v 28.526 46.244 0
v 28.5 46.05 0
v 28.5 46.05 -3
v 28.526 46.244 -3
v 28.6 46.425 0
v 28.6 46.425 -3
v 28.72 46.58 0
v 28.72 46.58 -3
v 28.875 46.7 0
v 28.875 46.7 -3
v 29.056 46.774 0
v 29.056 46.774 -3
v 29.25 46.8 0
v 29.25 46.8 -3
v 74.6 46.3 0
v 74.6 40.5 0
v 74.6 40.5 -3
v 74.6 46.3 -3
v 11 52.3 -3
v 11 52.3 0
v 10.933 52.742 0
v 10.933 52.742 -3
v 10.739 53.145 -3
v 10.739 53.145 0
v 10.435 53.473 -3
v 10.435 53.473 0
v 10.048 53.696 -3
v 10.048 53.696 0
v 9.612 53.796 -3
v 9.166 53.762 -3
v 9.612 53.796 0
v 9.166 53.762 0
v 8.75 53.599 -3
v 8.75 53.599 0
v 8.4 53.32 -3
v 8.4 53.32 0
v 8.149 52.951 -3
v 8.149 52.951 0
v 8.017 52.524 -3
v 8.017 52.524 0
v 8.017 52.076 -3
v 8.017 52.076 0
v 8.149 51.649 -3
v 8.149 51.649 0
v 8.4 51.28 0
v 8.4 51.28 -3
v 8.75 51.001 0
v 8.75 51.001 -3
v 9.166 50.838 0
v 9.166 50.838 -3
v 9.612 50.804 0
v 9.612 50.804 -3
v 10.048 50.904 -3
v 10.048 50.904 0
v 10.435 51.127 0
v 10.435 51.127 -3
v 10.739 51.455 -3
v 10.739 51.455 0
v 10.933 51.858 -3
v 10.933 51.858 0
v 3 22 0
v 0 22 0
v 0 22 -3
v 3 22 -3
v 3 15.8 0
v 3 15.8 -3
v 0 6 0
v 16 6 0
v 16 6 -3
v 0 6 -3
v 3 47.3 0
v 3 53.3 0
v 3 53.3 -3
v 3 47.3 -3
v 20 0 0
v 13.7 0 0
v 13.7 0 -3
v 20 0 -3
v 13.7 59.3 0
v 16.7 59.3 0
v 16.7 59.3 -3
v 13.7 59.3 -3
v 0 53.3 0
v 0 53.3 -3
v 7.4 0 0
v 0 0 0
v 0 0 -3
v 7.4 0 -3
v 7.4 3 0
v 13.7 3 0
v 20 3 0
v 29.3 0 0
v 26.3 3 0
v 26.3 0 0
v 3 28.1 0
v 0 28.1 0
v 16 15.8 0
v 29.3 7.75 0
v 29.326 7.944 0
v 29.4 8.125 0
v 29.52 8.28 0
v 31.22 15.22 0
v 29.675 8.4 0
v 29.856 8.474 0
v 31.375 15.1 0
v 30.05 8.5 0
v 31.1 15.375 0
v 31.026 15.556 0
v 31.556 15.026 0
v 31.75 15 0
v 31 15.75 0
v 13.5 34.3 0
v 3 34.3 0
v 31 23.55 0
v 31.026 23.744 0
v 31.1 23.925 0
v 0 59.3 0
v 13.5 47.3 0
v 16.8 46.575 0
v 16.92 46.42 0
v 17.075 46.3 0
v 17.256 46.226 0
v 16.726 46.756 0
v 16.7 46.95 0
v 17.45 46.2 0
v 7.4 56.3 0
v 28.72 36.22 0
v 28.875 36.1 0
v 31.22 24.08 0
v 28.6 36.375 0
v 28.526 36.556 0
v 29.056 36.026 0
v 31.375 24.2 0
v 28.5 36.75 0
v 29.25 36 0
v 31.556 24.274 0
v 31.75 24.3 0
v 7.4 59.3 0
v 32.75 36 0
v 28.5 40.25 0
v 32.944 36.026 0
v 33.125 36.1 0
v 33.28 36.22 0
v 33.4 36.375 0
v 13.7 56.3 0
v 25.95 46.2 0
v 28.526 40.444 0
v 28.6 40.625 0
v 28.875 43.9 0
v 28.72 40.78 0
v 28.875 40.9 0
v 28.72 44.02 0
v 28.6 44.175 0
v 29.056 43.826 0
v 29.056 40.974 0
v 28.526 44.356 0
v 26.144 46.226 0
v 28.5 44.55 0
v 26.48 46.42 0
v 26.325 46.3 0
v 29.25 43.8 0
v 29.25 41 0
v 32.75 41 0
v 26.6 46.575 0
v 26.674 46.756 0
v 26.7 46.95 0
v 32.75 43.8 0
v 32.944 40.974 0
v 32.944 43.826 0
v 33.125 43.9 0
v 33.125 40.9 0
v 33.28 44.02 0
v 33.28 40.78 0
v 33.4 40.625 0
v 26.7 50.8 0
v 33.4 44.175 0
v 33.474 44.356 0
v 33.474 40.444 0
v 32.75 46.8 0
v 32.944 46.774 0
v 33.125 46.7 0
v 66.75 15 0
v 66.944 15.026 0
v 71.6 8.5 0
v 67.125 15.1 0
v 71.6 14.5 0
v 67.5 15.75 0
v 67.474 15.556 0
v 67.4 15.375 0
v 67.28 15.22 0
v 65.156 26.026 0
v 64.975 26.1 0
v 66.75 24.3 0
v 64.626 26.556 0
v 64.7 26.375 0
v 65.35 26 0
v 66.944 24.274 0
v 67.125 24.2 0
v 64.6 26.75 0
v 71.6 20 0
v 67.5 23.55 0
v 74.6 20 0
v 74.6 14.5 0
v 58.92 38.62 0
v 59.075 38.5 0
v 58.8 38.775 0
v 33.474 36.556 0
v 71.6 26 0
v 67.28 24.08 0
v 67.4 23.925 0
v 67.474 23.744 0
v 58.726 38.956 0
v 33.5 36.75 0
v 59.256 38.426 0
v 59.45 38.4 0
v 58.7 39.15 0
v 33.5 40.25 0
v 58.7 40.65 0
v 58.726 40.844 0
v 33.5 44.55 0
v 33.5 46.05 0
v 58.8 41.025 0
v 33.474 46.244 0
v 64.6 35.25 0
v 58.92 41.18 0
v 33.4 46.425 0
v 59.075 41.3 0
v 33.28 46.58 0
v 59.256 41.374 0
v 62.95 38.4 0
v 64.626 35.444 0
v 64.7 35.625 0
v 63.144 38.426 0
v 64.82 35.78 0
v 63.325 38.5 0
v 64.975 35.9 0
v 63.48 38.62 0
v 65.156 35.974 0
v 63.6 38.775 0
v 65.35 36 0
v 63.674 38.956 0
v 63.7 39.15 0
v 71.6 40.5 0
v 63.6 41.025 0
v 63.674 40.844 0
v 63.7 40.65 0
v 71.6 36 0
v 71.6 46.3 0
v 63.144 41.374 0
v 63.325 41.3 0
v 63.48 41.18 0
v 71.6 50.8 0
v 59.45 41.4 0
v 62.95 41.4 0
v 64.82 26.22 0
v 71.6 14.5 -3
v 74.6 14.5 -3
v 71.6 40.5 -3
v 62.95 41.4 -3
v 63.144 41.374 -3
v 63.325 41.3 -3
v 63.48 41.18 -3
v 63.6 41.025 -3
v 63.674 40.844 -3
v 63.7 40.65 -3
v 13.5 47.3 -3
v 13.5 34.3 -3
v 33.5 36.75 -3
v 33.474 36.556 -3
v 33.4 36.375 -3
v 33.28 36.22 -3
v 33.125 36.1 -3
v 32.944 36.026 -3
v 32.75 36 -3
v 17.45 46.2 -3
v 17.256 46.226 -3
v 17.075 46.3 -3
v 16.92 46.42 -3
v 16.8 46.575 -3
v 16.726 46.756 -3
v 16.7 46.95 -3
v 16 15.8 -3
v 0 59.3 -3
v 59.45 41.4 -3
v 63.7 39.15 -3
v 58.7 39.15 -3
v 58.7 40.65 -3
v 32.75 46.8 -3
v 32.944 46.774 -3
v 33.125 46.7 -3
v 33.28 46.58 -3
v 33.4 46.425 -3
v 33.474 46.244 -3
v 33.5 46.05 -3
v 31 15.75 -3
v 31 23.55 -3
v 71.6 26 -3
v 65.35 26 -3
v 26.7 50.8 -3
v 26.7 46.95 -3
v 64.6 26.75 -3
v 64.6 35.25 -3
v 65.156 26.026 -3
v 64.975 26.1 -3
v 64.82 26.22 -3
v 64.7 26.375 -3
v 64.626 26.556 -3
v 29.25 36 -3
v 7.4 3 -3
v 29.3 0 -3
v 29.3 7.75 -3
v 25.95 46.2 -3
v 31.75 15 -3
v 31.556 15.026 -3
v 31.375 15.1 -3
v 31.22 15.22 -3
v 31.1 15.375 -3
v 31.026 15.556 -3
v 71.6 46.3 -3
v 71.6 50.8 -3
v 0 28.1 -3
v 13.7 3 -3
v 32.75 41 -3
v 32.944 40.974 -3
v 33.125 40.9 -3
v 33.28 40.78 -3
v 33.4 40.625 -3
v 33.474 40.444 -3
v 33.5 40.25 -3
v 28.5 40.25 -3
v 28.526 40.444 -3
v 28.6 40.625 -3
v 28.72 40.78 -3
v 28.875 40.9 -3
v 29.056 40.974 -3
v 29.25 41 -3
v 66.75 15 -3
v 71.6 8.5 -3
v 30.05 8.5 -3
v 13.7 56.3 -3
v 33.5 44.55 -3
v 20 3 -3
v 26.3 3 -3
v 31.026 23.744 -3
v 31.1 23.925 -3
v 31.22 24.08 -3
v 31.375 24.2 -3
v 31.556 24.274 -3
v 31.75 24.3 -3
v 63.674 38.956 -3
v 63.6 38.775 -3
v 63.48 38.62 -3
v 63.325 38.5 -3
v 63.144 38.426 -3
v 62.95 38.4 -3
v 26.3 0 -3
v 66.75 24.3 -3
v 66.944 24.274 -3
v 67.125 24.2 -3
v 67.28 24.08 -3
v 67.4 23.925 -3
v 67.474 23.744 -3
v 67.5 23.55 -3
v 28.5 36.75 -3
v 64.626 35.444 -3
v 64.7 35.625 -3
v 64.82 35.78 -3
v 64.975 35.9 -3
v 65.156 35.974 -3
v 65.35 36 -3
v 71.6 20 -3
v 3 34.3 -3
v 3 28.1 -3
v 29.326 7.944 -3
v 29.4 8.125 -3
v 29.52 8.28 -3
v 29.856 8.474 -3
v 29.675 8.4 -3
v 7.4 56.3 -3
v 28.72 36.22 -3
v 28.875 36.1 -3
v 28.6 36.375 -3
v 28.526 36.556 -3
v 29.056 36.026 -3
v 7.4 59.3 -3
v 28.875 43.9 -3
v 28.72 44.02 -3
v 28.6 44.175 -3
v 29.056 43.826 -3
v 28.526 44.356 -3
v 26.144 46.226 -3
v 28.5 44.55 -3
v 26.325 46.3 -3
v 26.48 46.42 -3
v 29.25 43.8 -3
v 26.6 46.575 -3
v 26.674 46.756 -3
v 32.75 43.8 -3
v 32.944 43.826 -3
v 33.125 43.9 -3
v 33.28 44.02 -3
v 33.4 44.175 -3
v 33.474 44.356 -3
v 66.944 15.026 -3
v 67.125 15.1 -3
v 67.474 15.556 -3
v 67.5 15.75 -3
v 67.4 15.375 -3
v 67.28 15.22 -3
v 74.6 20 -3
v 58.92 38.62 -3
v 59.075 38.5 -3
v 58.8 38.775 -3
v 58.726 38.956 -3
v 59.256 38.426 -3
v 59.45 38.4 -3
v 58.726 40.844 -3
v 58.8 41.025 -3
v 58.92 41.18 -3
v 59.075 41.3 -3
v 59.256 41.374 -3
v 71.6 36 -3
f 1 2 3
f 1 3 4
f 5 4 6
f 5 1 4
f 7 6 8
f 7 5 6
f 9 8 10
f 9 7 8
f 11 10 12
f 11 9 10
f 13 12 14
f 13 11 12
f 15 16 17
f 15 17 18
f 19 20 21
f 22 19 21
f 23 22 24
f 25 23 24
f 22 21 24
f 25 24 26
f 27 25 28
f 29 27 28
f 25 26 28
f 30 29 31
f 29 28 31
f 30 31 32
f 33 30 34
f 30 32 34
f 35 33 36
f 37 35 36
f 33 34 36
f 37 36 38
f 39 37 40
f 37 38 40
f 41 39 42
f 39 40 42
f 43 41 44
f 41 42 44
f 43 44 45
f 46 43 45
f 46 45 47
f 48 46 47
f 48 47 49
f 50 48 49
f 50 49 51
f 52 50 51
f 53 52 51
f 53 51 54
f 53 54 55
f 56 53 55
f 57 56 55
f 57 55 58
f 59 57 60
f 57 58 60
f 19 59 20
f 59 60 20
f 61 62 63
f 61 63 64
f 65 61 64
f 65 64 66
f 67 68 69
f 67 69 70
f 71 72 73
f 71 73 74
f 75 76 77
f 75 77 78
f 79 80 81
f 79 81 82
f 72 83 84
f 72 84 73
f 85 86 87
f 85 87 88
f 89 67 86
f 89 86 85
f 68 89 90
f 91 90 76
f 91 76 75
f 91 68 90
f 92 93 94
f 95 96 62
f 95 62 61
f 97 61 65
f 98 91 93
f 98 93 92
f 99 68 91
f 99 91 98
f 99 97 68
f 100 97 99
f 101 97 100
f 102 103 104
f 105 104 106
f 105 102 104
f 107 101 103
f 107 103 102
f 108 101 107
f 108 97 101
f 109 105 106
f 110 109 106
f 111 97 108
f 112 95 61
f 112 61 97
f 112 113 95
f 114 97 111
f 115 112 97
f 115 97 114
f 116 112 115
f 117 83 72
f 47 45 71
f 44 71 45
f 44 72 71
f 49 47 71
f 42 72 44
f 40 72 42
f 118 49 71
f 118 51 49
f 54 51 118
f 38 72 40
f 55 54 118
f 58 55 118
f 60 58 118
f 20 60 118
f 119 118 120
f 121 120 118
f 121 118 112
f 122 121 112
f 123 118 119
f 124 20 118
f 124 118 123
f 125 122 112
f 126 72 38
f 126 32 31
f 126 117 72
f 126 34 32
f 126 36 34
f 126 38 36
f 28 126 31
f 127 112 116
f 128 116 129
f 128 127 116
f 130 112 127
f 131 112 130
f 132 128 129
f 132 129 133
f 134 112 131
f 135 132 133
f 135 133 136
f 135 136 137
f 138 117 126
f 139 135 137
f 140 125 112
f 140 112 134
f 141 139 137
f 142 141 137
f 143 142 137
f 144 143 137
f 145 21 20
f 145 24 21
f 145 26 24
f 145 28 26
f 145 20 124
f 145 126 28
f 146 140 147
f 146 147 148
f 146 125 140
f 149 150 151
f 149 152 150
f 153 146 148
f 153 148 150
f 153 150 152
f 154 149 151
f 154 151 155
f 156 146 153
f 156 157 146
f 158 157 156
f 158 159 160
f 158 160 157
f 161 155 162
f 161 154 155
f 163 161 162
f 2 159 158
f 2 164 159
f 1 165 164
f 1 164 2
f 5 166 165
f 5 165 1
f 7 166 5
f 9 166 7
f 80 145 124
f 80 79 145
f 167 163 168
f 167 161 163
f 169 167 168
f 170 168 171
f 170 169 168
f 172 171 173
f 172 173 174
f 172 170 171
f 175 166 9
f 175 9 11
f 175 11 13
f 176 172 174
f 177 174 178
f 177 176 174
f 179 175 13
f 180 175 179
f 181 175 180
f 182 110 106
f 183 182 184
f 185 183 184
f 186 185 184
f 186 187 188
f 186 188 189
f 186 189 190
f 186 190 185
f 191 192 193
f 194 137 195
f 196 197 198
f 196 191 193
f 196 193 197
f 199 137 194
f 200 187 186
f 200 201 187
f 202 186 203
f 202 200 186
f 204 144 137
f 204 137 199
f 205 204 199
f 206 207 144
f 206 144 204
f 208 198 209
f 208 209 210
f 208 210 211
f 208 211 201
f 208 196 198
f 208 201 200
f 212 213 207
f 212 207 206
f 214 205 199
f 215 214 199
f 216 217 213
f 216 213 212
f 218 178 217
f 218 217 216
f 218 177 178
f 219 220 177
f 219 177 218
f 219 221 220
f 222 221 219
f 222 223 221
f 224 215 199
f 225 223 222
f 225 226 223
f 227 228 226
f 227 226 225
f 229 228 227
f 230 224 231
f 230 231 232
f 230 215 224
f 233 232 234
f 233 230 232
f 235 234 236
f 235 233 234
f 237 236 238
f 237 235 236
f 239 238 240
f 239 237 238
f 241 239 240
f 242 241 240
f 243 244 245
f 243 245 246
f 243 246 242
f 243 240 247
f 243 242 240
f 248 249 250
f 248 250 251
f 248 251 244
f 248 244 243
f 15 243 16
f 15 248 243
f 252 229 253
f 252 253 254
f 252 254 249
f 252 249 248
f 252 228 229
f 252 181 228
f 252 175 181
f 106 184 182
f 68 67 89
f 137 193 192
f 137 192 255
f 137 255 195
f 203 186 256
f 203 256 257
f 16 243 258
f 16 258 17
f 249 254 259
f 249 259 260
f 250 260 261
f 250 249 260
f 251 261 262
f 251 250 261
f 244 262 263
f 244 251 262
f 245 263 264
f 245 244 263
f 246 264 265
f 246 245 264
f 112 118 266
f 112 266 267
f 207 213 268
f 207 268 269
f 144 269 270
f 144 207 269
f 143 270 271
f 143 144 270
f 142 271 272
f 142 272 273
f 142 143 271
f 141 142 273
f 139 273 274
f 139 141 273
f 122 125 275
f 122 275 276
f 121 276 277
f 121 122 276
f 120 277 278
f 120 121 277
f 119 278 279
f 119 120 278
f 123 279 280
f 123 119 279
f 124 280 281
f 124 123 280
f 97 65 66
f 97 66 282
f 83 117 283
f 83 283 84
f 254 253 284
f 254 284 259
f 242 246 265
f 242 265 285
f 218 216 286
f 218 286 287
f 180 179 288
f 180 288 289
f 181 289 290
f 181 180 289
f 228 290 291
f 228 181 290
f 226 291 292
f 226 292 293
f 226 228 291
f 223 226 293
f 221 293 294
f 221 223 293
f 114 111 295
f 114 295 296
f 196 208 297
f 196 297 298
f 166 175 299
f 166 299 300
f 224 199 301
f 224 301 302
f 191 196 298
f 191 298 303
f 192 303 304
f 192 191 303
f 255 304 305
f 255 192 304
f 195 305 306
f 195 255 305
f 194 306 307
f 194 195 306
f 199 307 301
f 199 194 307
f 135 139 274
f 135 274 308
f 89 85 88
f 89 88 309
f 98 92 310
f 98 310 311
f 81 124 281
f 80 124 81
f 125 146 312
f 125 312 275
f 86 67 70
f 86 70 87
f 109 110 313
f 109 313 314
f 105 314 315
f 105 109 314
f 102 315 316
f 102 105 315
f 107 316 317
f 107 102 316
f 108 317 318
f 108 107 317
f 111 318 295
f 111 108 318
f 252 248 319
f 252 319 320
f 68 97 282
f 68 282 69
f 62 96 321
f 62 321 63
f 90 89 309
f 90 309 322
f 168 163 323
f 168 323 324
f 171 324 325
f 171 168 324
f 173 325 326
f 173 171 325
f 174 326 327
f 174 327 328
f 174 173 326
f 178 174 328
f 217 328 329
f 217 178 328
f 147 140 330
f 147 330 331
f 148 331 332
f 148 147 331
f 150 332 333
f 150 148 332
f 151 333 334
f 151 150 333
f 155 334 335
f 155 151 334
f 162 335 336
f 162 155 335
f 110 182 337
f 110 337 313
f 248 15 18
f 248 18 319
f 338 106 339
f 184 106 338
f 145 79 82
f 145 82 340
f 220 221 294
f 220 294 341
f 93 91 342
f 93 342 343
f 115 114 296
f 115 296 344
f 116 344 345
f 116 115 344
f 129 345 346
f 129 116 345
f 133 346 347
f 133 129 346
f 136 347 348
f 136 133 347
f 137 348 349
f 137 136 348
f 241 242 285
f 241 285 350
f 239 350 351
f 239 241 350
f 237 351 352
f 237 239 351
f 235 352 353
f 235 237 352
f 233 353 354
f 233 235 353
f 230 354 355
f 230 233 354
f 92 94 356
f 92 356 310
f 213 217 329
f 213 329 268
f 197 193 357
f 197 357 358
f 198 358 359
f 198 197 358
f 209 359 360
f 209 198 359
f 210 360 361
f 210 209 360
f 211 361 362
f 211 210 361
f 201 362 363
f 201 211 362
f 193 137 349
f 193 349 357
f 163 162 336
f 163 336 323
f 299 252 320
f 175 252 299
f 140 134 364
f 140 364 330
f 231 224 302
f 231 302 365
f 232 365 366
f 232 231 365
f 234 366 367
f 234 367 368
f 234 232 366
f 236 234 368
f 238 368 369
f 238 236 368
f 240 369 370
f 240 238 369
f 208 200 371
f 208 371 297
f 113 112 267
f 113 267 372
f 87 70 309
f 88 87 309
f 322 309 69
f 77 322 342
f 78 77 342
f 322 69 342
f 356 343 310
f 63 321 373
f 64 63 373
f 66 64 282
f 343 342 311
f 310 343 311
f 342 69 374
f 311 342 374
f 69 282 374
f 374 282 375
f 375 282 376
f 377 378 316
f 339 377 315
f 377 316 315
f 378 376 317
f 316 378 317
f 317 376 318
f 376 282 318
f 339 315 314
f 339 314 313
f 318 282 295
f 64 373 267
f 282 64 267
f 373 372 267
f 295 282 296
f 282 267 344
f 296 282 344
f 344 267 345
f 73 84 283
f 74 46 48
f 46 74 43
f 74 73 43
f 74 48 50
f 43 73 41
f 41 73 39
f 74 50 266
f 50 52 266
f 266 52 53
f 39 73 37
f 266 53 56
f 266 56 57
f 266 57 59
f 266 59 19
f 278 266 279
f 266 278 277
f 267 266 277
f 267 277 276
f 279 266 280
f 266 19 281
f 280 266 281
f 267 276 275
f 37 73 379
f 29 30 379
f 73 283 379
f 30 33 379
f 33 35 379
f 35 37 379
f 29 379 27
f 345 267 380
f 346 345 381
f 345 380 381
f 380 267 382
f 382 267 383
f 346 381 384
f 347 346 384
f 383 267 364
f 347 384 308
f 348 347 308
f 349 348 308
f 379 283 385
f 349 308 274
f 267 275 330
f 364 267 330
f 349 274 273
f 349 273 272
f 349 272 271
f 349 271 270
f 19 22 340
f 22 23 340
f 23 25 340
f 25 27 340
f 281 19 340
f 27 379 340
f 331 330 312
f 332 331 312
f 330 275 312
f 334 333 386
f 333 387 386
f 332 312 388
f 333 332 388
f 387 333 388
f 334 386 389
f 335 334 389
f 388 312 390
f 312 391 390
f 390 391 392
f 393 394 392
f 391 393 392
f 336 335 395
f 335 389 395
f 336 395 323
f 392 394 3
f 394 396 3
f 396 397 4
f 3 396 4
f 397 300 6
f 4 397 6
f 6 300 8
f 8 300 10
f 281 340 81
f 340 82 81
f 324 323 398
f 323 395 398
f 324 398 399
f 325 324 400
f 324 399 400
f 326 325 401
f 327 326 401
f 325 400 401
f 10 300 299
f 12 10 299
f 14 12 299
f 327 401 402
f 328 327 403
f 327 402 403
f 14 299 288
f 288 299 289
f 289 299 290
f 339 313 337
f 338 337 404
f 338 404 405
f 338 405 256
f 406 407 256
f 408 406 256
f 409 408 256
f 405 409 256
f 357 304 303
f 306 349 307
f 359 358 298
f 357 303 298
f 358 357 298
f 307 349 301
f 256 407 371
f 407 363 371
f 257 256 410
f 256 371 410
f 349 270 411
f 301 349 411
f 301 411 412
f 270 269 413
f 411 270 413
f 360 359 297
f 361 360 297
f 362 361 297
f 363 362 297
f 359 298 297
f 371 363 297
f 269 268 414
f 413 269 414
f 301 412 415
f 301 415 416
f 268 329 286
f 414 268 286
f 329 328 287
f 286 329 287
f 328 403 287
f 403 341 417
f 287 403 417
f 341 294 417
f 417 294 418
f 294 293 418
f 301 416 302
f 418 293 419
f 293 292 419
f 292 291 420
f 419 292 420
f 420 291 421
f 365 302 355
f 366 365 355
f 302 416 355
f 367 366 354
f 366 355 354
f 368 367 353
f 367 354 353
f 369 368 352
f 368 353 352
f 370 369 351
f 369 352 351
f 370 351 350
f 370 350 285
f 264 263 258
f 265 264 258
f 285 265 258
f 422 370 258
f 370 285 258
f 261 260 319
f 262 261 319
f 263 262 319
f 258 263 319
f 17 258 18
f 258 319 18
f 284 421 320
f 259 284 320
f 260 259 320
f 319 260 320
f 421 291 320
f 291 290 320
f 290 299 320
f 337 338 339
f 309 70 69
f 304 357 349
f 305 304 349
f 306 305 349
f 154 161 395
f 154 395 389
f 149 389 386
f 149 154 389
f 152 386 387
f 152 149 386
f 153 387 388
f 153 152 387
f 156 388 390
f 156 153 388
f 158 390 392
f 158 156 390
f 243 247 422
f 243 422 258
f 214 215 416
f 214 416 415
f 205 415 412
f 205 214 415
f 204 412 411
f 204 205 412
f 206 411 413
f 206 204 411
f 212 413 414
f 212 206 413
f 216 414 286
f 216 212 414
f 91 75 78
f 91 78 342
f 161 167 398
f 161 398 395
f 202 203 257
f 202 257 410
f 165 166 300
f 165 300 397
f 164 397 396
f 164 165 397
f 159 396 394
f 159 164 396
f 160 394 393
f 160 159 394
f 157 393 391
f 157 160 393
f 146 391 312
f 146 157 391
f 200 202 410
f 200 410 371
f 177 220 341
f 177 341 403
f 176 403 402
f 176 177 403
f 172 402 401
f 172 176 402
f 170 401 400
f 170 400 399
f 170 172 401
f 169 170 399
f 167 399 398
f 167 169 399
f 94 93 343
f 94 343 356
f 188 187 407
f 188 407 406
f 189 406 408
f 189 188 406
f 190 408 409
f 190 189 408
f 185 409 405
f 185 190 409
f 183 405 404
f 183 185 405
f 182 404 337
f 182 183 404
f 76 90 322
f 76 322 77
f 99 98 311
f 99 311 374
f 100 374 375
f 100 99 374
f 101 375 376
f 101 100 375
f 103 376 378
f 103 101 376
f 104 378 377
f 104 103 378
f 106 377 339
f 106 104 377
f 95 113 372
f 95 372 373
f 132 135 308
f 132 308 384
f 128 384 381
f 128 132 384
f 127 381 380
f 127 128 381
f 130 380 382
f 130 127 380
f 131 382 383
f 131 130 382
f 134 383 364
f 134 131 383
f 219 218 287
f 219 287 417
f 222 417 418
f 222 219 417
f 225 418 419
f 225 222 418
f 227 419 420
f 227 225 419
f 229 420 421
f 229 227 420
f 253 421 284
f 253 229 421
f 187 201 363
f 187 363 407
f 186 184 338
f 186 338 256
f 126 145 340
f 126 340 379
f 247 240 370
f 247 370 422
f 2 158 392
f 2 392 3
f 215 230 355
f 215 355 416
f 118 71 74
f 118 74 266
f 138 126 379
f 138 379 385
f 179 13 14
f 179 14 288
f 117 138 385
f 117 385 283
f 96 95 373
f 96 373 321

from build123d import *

# Parameters (mm, degrees)
F0_R     = 1.5
F1_DEPTH = 3


with BuildPart() as f1:
    # F0 (on Top) → F1 (new body)
    with BuildSketch(Plane.XY):
        with BuildLine():
            Line((0, 6), (0, 0))
            Line((0, 0), (7.4, 0))
            Line((7.4, 0), (7.4, 3))
            Line((7.4, 3), (13.7, 3))
            Line((13.7, 3), (13.7, 0))
            Line((13.7, 0), (20, 0))
            Line((20, 0), (20, 3))
            Line((20, 3), (26.3, 3))
            Line((26.3, 3), (26.3, 0))
            Line((26.3, 0), (29.3, 0))
            Line((29.3, 0), (29.3, 7.75))
            ThreePointArc((29.3, 7.75), (29.51967, 8.28033), (30.05, 8.5))
            Line((30.05, 8.5), (71.6, 8.5))
            Line((71.6, 8.5), (71.6, 14.5))
            Line((71.6, 14.5), (74.6, 14.5))
            Line((74.6, 14.5), (74.6, 20))
            Line((74.6, 20), (71.6, 20))
            Line((71.6, 20), (71.6, 26))
            Line((71.6, 26), (65.35, 26))
            ThreePointArc((65.35, 26), (64.81967, 26.21967), (64.6, 26.75))
            Line((64.6, 26.75), (64.6, 35.25))
            ThreePointArc((64.6, 35.25), (64.81967, 35.78033), (65.35, 36))
            Line((65.35, 36), (71.6, 36))
            Line((71.6, 36), (71.6, 40.5))
            Line((71.6, 40.5), (74.6, 40.5))
            Line((74.6, 40.5), (74.6, 46.3))
            Line((74.6, 46.3), (71.6, 46.3))
            Line((71.6, 46.3), (71.6, 50.8))
            Line((71.6, 50.8), (26.7, 50.8))
            Line((26.7, 50.8), (26.7, 46.95))
            ThreePointArc((26.7, 46.95), (26.48033, 46.41967), (25.95, 46.2))
            Line((25.95, 46.2), (17.45, 46.2))
            ThreePointArc((17.45, 46.2), (16.91967, 46.41967), (16.7, 46.95))
            Line((16.7, 46.95), (16.7, 59.3))
            Line((16.7, 59.3), (13.7, 59.3))
            Line((13.7, 59.3), (13.7, 56.3))
            Line((13.7, 56.3), (7.4, 56.3))
            Line((7.4, 56.3), (7.4, 59.3))
            Line((7.4, 59.3), (0, 59.3))
            Line((0, 59.3), (0, 53.3))
            Line((0, 53.3), (3, 53.3))
            Line((3, 53.3), (3, 47.3))
            Line((3, 47.3), (13.5, 47.3))
            Line((13.5, 47.3), (13.5, 34.3))
            Line((13.5, 34.3), (3, 34.3))
            Line((3, 34.3), (3, 28.1))
            Line((3, 28.1), (0, 28.1))
            Line((0, 28.1), (0, 22))
            Line((0, 22), (3, 22))
            Line((3, 22), (3, 15.8))
            Line((3, 15.8), (16, 15.8))
            Line((16, 15.8), (16, 6))
            Line((16, 6), (0, 6))
        make_face()
        with BuildLine():
            Line((66.75, 15), (31.75, 15))
            ThreePointArc((31.75, 15), (31.21967, 15.21967), (31, 15.75))
            Line((31, 15.75), (31, 23.55))
            ThreePointArc((31, 23.55), (31.21967, 24.08033), (31.75, 24.3))
            Line((31.75, 24.3), (66.75, 24.3))
            ThreePointArc((66.75, 24.3), (67.28033, 24.08033), (67.5, 23.55))
            Line((67.5, 23.55), (67.5, 15.75))
            ThreePointArc((67.5, 15.75), (67.28033, 15.21967), (66.75, 15))
        make_face(mode=Mode.SUBTRACT)
        with BuildLine():
            Line((32.75, 36), (29.25, 36))
            ThreePointArc((29.25, 36), (28.71967, 36.21967), (28.5, 36.75))
            Line((28.5, 36.75), (28.5, 40.25))
            ThreePointArc((28.5, 40.25), (28.71967, 40.78033), (29.25, 41))
            Line((29.25, 41), (32.75, 41))
            ThreePointArc((32.75, 41), (33.28033, 40.78033), (33.5, 40.25))
            Line((33.5, 40.25), (33.5, 36.75))
            ThreePointArc((33.5, 36.75), (33.28033, 36.21967), (32.75, 36))
        make_face(mode=Mode.SUBTRACT)
        with Locations((9.5, 52.3)):
            Circle(F0_R, mode=Mode.SUBTRACT)
        with BuildLine():
            Line((32.75, 43.8), (29.25, 43.8))
            ThreePointArc((29.25, 43.8), (28.71967, 44.01967), (28.5, 44.55))
            Line((28.5, 44.55), (28.5, 46.05))
            ThreePointArc((28.5, 46.05), (28.71967, 46.58033), (29.25, 46.8))
            Line((29.25, 46.8), (32.75, 46.8))
            ThreePointArc((32.75, 46.8), (33.28033, 46.58033), (33.5, 46.05))
            Line((33.5, 46.05), (33.5, 44.55))
            ThreePointArc((33.5, 44.55), (33.28033, 44.01967), (32.75, 43.8))
        make_face(mode=Mode.SUBTRACT)
        with BuildLine():
            Line((62.95, 38.4), (59.45, 38.4))
            ThreePointArc((59.45, 38.4), (58.91967, 38.61967), (58.7, 39.15))
            Line((58.7, 39.15), (58.7, 40.65))
            ThreePointArc((58.7, 40.65), (58.91967, 41.18033), (59.45, 41.4))
            Line((59.45, 41.4), (62.95, 41.4))
            ThreePointArc((62.95, 41.4), (63.48033, 41.18033), (63.7, 40.65))
            Line((63.7, 40.65), (63.7, 39.15))
            ThreePointArc((63.7, 39.15), (63.48033, 38.61967), (62.95, 38.4))
        make_face(mode=Mode.SUBTRACT)
    extrude(amount=-F1_DEPTH)


solid = f1.part
